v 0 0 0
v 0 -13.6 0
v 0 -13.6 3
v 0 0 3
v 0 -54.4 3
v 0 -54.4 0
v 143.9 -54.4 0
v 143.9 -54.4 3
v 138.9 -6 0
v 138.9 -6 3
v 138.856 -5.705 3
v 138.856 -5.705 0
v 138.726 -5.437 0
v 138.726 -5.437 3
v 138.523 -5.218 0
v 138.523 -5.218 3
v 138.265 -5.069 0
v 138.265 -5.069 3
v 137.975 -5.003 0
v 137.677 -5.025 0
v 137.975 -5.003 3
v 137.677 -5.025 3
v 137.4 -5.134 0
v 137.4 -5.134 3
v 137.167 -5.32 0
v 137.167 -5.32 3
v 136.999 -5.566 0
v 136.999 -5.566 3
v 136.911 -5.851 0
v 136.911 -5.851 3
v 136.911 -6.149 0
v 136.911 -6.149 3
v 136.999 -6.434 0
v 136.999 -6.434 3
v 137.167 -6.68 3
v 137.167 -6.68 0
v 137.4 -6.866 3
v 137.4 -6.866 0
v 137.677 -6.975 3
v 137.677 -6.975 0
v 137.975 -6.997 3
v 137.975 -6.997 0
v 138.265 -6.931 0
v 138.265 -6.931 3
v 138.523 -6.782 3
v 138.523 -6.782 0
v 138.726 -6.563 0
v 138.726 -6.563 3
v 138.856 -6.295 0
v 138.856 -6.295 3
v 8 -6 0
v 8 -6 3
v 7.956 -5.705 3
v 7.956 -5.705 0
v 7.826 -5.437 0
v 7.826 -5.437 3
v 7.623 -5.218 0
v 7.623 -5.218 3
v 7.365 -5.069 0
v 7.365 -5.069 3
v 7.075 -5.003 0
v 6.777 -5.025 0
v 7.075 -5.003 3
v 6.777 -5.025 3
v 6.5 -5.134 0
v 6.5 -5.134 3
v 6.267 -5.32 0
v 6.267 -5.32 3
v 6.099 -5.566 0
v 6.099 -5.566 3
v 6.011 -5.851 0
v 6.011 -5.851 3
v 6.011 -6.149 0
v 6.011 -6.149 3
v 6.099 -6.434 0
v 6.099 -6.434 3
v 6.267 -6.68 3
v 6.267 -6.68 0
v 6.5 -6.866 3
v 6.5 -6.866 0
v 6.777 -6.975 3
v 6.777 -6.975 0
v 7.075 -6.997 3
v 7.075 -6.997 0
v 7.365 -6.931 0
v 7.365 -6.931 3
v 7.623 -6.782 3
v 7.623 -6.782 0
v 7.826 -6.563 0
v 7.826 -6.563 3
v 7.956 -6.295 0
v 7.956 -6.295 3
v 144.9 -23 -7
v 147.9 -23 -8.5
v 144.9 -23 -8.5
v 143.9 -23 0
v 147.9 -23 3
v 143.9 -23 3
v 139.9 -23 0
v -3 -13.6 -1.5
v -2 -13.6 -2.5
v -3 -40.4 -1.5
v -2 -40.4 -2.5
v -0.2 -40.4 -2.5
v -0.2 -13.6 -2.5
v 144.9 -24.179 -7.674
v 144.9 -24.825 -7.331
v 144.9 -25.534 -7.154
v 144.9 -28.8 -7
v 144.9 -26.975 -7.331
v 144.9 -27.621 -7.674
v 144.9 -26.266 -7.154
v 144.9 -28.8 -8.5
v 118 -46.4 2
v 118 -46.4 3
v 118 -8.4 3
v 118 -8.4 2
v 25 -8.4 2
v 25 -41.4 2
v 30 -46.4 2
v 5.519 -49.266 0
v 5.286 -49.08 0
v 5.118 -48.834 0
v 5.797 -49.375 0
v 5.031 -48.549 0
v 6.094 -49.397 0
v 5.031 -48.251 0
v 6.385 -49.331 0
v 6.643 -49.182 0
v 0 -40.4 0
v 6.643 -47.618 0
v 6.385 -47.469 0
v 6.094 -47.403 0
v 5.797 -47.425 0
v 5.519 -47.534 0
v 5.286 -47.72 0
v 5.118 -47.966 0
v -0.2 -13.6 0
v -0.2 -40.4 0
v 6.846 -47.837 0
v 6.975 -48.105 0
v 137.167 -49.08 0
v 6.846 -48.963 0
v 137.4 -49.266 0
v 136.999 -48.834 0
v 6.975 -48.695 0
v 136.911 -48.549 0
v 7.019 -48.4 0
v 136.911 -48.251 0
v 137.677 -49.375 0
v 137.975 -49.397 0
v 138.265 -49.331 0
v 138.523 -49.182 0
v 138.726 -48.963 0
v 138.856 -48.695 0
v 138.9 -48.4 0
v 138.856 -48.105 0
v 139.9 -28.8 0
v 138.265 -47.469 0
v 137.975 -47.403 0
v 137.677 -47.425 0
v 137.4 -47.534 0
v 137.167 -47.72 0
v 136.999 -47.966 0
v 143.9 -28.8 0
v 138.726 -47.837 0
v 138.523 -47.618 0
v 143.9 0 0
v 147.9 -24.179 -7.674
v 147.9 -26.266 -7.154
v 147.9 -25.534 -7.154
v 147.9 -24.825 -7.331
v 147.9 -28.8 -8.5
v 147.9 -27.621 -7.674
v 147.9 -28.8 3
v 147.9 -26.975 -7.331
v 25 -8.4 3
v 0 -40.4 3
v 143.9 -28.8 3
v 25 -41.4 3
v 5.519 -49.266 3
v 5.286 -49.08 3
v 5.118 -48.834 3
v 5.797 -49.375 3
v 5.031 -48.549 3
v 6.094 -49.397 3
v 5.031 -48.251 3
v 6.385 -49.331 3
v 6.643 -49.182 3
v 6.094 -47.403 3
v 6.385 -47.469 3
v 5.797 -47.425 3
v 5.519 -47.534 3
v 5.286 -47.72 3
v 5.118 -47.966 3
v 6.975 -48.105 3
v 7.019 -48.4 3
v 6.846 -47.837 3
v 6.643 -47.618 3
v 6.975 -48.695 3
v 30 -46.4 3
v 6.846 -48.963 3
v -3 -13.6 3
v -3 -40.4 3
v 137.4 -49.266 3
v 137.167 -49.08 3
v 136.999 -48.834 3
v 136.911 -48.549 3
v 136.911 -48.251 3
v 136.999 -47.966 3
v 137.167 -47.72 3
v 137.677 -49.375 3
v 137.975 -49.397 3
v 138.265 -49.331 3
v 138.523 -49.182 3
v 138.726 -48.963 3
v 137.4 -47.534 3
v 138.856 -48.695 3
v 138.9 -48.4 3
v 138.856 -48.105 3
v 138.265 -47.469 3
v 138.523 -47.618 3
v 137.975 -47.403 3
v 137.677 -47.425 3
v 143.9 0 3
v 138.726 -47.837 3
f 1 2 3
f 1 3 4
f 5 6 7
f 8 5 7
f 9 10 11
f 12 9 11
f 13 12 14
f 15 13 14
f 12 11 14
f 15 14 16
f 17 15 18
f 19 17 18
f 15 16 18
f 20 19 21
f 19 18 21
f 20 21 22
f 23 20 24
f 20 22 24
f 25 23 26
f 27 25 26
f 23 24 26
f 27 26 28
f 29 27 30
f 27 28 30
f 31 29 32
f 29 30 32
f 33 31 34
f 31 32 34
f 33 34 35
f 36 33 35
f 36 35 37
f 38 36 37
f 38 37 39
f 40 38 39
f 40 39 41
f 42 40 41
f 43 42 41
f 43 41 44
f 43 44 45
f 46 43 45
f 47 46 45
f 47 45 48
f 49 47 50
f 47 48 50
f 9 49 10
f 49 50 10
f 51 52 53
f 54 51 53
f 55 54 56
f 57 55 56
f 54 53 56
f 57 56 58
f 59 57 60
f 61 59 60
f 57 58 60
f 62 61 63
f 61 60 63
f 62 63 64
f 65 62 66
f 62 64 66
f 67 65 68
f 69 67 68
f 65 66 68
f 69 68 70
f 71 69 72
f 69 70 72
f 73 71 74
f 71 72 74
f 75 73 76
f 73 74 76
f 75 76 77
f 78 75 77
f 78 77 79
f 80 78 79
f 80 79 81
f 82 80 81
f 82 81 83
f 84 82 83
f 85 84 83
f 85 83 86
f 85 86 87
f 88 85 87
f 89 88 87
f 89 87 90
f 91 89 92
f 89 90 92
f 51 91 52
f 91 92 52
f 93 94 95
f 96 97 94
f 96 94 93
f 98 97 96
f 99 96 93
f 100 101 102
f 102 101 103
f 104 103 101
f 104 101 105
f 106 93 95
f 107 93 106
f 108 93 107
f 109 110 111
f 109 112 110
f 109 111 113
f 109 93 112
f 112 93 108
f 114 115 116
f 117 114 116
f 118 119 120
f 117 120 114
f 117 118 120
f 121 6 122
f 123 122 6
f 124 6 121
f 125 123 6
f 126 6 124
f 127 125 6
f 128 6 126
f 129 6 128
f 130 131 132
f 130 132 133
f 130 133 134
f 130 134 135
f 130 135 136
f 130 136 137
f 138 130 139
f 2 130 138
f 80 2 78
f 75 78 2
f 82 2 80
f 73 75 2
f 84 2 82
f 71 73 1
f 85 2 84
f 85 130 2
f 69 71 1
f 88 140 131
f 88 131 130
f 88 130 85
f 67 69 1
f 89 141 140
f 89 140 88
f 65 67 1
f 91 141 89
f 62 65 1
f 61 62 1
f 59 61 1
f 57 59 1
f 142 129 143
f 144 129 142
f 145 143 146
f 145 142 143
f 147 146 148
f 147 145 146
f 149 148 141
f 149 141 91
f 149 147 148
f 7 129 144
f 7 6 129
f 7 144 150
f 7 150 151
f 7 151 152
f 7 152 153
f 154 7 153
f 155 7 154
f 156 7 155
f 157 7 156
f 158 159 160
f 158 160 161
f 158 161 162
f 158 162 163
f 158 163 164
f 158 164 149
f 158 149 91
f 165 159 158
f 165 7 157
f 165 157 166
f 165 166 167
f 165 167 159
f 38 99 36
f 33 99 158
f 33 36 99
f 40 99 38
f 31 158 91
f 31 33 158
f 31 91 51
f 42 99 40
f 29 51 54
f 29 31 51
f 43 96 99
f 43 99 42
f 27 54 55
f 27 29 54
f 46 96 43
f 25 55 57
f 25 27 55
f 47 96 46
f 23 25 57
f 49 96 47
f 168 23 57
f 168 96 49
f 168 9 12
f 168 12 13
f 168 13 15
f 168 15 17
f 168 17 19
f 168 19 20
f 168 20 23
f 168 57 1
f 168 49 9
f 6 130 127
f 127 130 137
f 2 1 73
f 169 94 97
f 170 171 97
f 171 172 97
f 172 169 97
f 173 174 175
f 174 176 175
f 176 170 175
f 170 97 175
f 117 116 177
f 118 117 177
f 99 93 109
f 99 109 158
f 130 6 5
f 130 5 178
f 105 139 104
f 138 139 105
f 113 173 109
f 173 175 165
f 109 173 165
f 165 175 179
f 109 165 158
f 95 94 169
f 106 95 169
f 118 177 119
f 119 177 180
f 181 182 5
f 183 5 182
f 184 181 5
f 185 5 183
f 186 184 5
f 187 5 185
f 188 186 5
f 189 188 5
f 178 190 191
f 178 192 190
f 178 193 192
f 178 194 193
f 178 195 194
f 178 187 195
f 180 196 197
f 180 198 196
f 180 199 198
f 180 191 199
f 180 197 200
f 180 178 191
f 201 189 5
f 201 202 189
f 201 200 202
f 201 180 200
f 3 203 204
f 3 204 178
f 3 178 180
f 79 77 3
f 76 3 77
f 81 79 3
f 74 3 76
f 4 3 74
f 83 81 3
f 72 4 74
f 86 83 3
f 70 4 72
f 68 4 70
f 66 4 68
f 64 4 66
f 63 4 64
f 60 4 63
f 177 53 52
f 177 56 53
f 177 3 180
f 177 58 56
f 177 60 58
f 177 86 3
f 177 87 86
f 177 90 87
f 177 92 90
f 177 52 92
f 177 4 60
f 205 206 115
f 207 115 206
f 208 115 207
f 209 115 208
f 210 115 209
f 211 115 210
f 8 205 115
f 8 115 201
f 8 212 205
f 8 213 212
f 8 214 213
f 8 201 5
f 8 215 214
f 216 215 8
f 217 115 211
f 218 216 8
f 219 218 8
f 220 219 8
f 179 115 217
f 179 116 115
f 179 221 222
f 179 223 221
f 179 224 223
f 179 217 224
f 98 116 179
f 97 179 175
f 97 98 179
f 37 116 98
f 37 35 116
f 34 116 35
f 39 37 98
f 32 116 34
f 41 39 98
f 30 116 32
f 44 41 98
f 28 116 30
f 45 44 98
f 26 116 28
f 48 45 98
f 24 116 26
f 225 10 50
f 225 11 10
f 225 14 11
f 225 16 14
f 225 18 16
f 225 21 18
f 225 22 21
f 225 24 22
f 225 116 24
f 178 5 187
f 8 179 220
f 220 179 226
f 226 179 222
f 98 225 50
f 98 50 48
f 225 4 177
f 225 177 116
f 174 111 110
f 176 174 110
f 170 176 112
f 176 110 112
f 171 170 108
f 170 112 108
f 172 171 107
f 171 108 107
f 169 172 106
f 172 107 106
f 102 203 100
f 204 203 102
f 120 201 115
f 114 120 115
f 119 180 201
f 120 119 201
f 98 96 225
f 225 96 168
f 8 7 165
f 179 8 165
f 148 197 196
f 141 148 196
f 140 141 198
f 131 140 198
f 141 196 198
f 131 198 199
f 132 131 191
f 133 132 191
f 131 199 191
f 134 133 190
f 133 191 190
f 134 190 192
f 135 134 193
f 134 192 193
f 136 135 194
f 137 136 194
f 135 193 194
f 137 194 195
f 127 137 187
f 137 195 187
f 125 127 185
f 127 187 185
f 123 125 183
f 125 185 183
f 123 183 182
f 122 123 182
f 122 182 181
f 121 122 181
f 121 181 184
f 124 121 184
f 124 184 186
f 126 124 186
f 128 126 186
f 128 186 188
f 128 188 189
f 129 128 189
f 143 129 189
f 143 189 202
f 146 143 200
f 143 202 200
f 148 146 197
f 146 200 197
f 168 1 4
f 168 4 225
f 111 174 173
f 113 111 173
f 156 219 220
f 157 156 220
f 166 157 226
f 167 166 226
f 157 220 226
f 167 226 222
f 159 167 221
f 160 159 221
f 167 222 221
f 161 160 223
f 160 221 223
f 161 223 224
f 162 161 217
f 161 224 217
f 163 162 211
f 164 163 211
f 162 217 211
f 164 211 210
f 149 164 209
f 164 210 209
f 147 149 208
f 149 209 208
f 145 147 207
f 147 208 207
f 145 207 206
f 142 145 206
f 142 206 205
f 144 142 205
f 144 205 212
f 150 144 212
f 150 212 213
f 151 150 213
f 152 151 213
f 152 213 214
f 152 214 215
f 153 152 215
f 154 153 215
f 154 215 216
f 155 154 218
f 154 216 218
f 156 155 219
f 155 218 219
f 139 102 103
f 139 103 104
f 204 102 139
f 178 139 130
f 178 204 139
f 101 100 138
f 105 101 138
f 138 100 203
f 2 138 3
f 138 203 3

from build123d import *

# Parameters (mm, degrees)
F0_W      = 143.9
F0_H      = 54.4
F1_DEPTH  = 3
F2_W      = 5.8
F2_H      = 3
F3_DEPTH  = 4
F4_W      = 4
F4_H      = 5.8
F5_DEPTH  = 8.5
F7_DEPTH  = 5
F8_R      = 3
F9_W      = 26.8
F9_H      = 3
F10_DEPTH = 3
F11_W     = 3
F11_H     = 26.8
F12_DEPTH = 2.5
F13_W     = 26.8
F13_H     = 2.5
F14_DEPTH = 0.2
F16_DEPTH = 1
F17_W     = 5.8
F17_H     = 12.271342
F18_DEPTH = 1
F20_DEPTH = 5.8
F21_SIZE  = 1
F22_R     = 1
F23_DEPTH = 3


with BuildPart() as f1:
    # F0 (on Top) → F1 (new body)
    with BuildSketch(Plane.XY):
        with Locations((71.95, -27.2)):
            Rectangle(F0_W, F0_H)
    extrude(amount=F1_DEPTH)

    # F2 (on face) → F3 (join)
    with BuildSketch(Plane.YZ.offset(143.9)):
        with Locations((-25.9, 1.5)):
            Rectangle(F2_W, F2_H)
    extrude(amount=F3_DEPTH)

    # F4 (on face) → F5 (join)
    with BuildSketch(Plane(origin=(0, 0, 0), x_dir=(1, 0, 0), z_dir=(0, 0, -1))):
        with Locations((145.9, 25.9)):
            Rectangle(F4_W, F4_H)
    extrude(amount=F5_DEPTH)

    # F6 (on face) → F7 (cut)
    with BuildSketch(Plane.YZ.offset(147.9)):
        Polygon((-25.9, -6.469398), (-28.8, -8.5), (-23, -8.5), align=None)
    extrude(amount=-F7_DEPTH, mode=Mode.SUBTRACT)

    # F8
    f8_edges = [f1.edges().sort_by_distance(p)[0] for p in [
        (145.9, -25.9, -6.469398),
    ]]
    fillet(f8_edges, radius=F8_R)

    # F9 (on face) → F10 (join)
    with BuildSketch(Plane(origin=(0, 0, 0), x_dir=(0, -1, 0), z_dir=(-1, 0, 0))):
        with Locations((27, 1.5)):
            Rectangle(F9_W, F9_H)
    extrude(amount=F10_DEPTH)

    # F11 (on face) → F12 (join)
    with BuildSketch(Plane(origin=(0, 0, 0), x_dir=(1, 0, 0), z_dir=(0, 0, -1))):
        with Locations((-1.5, 27)):
            Rectangle(F11_W, F11_H)
    extrude(amount=F12_DEPTH)

    # F13 (on face) → F14 (cut)
    with BuildSketch(Plane.YZ):
        with Locations((-27, -1.25)):
            Rectangle(F13_W, F13_H)
    extrude(amount=-F14_DEPTH, mode=Mode.SUBTRACT)

    # F15 (on face) → F16 (cut)
    with BuildSketch(Plane.XY.offset(3)):
        Polygon((118, -8.4), (25, -8.4), (25, -41.4), (30, -46.4), (118, -46.4), align=None)
    extrude(amount=-F16_DEPTH, mode=Mode.SUBTRACT)

    # F17 (on face) → F18 (cut)
    with BuildSketch(Plane(origin=(143.9, 0, 0), x_dir=(0, -1, 0), z_dir=(-1, 0, 0))):
        with Locations((25.9, -6.135671)):
            Rectangle(F17_W, F17_H)
    extrude(amount=-F18_DEPTH, mode=Mode.SUBTRACT)

    # F19 (on face) → F20 (join)
    with BuildSketch(Plane(origin=(0, -23, 0), x_dir=(-1, 0, 0), z_dir=(0, 1, 0))):
        Polygon((-139.9, 0), (-144.9, 0), (-144.9, -7), align=None)
    extrude(amount=-F20_DEPTH)

    # F21
    f21_edges = [f1.edges().sort_by_distance(p)[0] for p in [
        (-3, -27, -2.5),
    ]]
    chamfer(f21_edges, length=F21_SIZE)

    # F22 (on face) → F23 (cut)
    with BuildSketch(Plane.XY.offset(3)):
        with Locations((137.9, -48.4)):
            Circle(F22_R)
        with Locations((137.9, -6)):
            Circle(F22_R)
        with Locations((6.019338, -48.4)):
            Circle(F22_R)
        with Locations((7, -6)):
            Circle(F22_R)
    extrude(amount=-F23_DEPTH, mode=Mode.SUBTRACT)


solid = f1.part
